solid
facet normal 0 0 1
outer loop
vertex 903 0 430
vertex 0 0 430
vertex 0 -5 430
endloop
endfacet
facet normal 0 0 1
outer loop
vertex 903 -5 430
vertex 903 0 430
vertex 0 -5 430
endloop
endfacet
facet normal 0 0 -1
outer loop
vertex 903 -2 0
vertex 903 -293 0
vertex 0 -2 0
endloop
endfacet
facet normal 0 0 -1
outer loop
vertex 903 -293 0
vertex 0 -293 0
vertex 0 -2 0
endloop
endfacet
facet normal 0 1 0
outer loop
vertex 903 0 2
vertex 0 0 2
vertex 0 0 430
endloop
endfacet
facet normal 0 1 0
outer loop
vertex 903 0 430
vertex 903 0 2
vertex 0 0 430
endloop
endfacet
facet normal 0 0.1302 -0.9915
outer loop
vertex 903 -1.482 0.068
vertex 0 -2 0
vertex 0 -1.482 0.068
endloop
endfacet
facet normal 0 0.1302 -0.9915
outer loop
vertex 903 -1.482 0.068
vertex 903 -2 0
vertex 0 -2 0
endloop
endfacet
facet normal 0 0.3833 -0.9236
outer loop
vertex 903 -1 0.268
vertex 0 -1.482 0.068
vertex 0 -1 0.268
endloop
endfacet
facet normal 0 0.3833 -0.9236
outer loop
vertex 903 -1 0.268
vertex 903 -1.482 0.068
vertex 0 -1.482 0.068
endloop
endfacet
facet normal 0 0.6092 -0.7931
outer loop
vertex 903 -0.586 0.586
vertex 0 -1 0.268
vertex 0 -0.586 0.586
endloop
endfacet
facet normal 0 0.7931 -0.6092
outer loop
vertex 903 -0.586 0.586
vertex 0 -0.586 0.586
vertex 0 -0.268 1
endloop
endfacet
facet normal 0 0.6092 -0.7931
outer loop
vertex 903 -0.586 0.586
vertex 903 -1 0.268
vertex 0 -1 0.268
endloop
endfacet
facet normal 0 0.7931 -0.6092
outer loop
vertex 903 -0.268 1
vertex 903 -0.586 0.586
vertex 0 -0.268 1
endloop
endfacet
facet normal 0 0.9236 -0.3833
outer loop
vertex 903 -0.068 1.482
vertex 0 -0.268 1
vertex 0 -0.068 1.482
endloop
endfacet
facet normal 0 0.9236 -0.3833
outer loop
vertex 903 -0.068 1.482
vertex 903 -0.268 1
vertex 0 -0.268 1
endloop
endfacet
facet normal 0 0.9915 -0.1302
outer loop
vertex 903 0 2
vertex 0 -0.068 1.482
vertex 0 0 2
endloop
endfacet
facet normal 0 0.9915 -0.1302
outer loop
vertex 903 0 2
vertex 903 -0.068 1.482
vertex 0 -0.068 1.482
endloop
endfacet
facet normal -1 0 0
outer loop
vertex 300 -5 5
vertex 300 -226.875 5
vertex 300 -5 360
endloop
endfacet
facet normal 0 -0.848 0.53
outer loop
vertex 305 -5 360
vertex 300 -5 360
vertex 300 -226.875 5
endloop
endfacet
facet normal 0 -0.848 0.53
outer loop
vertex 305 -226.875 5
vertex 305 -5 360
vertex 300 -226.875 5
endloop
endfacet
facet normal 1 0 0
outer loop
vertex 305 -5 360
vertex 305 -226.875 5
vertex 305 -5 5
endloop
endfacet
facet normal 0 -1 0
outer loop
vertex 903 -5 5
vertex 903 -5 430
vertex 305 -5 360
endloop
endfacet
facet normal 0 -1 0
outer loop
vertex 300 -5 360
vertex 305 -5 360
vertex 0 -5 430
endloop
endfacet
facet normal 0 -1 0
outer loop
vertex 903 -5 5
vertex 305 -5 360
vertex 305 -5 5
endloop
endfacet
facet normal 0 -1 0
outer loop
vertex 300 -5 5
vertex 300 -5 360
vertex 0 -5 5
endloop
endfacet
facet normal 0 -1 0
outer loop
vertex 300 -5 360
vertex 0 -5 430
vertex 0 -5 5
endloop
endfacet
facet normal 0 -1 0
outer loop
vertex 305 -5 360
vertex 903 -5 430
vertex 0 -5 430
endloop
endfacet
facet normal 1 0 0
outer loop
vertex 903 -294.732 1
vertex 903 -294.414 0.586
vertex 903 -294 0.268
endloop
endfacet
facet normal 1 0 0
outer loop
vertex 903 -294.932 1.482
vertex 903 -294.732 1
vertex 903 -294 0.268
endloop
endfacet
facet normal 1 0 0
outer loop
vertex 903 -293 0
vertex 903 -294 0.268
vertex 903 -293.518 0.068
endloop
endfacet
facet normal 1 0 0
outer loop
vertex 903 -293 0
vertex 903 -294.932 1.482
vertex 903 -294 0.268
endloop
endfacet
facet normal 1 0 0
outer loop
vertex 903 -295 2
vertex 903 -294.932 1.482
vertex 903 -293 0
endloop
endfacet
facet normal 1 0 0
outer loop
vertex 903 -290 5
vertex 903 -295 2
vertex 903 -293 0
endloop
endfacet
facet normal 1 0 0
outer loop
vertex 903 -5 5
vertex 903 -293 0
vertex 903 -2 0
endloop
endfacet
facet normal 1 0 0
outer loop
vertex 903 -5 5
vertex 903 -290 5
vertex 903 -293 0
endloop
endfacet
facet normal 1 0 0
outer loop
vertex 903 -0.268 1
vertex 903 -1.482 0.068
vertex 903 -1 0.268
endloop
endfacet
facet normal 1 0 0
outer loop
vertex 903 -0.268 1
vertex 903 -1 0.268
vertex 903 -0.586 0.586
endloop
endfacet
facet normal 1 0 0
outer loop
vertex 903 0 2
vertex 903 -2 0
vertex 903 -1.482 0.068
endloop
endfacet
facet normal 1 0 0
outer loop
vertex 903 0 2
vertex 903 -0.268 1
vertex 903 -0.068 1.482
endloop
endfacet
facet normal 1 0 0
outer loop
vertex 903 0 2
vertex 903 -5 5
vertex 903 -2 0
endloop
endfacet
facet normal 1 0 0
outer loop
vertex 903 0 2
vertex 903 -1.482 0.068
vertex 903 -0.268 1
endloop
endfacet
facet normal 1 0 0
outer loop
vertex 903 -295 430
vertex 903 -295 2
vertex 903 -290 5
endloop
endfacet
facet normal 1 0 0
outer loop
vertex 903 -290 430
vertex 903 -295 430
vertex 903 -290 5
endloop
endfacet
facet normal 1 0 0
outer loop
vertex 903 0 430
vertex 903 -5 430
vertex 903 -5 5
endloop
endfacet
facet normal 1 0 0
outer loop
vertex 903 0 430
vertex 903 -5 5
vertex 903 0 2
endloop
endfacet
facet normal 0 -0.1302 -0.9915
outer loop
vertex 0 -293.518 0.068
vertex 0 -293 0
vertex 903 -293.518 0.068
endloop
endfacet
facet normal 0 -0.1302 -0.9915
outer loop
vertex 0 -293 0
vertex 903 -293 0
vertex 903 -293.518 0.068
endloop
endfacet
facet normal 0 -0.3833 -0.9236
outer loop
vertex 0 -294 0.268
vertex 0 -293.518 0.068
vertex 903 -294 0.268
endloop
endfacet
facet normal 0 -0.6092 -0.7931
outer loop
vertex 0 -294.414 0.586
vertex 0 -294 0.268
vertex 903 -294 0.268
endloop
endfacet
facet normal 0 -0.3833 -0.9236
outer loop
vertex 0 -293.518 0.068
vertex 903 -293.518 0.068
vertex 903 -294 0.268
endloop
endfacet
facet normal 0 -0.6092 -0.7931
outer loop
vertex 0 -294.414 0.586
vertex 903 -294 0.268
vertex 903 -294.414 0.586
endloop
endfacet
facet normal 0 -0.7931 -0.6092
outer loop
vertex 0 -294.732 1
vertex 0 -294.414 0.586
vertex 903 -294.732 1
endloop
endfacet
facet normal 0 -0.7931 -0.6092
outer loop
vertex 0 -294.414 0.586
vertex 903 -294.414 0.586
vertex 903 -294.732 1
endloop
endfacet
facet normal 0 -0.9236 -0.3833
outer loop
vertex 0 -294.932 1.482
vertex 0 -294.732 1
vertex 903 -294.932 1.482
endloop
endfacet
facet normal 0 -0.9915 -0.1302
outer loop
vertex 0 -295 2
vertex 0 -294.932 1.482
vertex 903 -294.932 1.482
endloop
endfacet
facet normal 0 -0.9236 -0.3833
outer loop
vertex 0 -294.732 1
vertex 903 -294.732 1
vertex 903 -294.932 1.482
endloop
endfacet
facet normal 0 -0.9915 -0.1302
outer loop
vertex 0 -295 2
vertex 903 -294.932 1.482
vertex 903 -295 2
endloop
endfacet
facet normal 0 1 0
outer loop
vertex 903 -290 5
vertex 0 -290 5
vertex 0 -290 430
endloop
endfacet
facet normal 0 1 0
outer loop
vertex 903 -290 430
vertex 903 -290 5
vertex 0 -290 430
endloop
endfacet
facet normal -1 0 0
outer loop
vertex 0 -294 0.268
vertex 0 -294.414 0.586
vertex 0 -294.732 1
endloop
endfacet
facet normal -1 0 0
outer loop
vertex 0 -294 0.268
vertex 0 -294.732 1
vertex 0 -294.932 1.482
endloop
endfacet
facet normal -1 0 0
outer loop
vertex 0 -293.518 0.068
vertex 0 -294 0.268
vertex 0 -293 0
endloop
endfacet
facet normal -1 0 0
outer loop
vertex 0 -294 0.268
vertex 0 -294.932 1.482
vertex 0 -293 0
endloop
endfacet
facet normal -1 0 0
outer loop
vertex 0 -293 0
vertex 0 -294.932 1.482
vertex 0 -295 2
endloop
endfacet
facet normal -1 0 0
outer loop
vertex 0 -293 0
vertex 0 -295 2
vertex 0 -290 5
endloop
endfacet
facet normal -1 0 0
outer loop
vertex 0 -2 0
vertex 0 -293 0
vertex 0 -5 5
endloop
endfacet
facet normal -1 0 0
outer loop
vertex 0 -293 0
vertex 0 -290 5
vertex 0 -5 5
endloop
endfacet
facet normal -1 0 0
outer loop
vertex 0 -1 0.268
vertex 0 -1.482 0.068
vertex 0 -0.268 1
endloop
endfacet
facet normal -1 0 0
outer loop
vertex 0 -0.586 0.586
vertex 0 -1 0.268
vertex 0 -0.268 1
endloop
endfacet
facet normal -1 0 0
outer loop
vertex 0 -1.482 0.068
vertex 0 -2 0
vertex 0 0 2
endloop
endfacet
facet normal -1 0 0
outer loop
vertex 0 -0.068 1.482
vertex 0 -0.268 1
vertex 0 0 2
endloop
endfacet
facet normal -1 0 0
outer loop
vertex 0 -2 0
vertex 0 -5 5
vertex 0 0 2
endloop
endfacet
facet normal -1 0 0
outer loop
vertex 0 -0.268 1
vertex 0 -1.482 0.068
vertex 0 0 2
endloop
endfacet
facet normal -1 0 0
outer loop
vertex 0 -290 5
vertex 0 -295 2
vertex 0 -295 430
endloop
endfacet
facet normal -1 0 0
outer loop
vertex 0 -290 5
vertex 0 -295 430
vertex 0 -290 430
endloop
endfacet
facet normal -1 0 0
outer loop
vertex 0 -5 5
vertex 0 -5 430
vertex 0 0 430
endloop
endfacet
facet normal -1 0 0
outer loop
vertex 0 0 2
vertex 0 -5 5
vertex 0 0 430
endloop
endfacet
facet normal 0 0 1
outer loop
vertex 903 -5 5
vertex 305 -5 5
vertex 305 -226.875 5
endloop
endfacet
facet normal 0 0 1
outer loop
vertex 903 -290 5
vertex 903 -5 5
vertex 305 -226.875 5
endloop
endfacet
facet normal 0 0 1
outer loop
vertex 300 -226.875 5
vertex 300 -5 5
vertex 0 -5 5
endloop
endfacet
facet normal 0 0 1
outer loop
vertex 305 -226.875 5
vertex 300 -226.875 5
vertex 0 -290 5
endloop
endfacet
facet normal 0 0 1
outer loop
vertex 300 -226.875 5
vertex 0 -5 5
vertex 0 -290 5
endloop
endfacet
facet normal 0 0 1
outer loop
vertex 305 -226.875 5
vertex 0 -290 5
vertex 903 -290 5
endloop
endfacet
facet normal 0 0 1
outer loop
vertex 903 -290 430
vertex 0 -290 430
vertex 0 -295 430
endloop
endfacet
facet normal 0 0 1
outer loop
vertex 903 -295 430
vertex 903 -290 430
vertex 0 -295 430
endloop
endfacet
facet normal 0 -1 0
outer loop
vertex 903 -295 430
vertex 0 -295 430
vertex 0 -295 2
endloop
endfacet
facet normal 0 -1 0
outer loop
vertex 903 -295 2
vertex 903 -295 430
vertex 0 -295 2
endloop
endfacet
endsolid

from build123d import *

# Parameters (mm, degrees)
F1_DEPTH = 903
F4_DEPTH = 5
F5_R     = 2


# Not quite as in the source:
# - a feature names something its author has since deleted; it is built from what else it names


with BuildPart() as f1:
    # F0 (on Right) → F1 (new body)
    with BuildSketch(Plane.YZ):
        Polygon((-295, 0), (0, 0), (0, 430), (-5, 430), (-5, 5), (-290, 5), (-290, 430), (-295, 430), align=None)
    extrude(amount=F1_DEPTH)

    # F3 (on offset) → F4 (join)
    with BuildSketch(Plane.YZ.offset(300)):
        Polygon((-230, 0), (-5, 0), (-5, 360), align=None)
    extrude(amount=F4_DEPTH)

    # F5
    f5_edges = [f1.edges().sort_by_distance(p)[0] for p in [
        (451.5, 0, 0),
        (451.5, -295, 0),
    ]]
    fillet(f5_edges, radius=F5_R)


solid = f1.part
